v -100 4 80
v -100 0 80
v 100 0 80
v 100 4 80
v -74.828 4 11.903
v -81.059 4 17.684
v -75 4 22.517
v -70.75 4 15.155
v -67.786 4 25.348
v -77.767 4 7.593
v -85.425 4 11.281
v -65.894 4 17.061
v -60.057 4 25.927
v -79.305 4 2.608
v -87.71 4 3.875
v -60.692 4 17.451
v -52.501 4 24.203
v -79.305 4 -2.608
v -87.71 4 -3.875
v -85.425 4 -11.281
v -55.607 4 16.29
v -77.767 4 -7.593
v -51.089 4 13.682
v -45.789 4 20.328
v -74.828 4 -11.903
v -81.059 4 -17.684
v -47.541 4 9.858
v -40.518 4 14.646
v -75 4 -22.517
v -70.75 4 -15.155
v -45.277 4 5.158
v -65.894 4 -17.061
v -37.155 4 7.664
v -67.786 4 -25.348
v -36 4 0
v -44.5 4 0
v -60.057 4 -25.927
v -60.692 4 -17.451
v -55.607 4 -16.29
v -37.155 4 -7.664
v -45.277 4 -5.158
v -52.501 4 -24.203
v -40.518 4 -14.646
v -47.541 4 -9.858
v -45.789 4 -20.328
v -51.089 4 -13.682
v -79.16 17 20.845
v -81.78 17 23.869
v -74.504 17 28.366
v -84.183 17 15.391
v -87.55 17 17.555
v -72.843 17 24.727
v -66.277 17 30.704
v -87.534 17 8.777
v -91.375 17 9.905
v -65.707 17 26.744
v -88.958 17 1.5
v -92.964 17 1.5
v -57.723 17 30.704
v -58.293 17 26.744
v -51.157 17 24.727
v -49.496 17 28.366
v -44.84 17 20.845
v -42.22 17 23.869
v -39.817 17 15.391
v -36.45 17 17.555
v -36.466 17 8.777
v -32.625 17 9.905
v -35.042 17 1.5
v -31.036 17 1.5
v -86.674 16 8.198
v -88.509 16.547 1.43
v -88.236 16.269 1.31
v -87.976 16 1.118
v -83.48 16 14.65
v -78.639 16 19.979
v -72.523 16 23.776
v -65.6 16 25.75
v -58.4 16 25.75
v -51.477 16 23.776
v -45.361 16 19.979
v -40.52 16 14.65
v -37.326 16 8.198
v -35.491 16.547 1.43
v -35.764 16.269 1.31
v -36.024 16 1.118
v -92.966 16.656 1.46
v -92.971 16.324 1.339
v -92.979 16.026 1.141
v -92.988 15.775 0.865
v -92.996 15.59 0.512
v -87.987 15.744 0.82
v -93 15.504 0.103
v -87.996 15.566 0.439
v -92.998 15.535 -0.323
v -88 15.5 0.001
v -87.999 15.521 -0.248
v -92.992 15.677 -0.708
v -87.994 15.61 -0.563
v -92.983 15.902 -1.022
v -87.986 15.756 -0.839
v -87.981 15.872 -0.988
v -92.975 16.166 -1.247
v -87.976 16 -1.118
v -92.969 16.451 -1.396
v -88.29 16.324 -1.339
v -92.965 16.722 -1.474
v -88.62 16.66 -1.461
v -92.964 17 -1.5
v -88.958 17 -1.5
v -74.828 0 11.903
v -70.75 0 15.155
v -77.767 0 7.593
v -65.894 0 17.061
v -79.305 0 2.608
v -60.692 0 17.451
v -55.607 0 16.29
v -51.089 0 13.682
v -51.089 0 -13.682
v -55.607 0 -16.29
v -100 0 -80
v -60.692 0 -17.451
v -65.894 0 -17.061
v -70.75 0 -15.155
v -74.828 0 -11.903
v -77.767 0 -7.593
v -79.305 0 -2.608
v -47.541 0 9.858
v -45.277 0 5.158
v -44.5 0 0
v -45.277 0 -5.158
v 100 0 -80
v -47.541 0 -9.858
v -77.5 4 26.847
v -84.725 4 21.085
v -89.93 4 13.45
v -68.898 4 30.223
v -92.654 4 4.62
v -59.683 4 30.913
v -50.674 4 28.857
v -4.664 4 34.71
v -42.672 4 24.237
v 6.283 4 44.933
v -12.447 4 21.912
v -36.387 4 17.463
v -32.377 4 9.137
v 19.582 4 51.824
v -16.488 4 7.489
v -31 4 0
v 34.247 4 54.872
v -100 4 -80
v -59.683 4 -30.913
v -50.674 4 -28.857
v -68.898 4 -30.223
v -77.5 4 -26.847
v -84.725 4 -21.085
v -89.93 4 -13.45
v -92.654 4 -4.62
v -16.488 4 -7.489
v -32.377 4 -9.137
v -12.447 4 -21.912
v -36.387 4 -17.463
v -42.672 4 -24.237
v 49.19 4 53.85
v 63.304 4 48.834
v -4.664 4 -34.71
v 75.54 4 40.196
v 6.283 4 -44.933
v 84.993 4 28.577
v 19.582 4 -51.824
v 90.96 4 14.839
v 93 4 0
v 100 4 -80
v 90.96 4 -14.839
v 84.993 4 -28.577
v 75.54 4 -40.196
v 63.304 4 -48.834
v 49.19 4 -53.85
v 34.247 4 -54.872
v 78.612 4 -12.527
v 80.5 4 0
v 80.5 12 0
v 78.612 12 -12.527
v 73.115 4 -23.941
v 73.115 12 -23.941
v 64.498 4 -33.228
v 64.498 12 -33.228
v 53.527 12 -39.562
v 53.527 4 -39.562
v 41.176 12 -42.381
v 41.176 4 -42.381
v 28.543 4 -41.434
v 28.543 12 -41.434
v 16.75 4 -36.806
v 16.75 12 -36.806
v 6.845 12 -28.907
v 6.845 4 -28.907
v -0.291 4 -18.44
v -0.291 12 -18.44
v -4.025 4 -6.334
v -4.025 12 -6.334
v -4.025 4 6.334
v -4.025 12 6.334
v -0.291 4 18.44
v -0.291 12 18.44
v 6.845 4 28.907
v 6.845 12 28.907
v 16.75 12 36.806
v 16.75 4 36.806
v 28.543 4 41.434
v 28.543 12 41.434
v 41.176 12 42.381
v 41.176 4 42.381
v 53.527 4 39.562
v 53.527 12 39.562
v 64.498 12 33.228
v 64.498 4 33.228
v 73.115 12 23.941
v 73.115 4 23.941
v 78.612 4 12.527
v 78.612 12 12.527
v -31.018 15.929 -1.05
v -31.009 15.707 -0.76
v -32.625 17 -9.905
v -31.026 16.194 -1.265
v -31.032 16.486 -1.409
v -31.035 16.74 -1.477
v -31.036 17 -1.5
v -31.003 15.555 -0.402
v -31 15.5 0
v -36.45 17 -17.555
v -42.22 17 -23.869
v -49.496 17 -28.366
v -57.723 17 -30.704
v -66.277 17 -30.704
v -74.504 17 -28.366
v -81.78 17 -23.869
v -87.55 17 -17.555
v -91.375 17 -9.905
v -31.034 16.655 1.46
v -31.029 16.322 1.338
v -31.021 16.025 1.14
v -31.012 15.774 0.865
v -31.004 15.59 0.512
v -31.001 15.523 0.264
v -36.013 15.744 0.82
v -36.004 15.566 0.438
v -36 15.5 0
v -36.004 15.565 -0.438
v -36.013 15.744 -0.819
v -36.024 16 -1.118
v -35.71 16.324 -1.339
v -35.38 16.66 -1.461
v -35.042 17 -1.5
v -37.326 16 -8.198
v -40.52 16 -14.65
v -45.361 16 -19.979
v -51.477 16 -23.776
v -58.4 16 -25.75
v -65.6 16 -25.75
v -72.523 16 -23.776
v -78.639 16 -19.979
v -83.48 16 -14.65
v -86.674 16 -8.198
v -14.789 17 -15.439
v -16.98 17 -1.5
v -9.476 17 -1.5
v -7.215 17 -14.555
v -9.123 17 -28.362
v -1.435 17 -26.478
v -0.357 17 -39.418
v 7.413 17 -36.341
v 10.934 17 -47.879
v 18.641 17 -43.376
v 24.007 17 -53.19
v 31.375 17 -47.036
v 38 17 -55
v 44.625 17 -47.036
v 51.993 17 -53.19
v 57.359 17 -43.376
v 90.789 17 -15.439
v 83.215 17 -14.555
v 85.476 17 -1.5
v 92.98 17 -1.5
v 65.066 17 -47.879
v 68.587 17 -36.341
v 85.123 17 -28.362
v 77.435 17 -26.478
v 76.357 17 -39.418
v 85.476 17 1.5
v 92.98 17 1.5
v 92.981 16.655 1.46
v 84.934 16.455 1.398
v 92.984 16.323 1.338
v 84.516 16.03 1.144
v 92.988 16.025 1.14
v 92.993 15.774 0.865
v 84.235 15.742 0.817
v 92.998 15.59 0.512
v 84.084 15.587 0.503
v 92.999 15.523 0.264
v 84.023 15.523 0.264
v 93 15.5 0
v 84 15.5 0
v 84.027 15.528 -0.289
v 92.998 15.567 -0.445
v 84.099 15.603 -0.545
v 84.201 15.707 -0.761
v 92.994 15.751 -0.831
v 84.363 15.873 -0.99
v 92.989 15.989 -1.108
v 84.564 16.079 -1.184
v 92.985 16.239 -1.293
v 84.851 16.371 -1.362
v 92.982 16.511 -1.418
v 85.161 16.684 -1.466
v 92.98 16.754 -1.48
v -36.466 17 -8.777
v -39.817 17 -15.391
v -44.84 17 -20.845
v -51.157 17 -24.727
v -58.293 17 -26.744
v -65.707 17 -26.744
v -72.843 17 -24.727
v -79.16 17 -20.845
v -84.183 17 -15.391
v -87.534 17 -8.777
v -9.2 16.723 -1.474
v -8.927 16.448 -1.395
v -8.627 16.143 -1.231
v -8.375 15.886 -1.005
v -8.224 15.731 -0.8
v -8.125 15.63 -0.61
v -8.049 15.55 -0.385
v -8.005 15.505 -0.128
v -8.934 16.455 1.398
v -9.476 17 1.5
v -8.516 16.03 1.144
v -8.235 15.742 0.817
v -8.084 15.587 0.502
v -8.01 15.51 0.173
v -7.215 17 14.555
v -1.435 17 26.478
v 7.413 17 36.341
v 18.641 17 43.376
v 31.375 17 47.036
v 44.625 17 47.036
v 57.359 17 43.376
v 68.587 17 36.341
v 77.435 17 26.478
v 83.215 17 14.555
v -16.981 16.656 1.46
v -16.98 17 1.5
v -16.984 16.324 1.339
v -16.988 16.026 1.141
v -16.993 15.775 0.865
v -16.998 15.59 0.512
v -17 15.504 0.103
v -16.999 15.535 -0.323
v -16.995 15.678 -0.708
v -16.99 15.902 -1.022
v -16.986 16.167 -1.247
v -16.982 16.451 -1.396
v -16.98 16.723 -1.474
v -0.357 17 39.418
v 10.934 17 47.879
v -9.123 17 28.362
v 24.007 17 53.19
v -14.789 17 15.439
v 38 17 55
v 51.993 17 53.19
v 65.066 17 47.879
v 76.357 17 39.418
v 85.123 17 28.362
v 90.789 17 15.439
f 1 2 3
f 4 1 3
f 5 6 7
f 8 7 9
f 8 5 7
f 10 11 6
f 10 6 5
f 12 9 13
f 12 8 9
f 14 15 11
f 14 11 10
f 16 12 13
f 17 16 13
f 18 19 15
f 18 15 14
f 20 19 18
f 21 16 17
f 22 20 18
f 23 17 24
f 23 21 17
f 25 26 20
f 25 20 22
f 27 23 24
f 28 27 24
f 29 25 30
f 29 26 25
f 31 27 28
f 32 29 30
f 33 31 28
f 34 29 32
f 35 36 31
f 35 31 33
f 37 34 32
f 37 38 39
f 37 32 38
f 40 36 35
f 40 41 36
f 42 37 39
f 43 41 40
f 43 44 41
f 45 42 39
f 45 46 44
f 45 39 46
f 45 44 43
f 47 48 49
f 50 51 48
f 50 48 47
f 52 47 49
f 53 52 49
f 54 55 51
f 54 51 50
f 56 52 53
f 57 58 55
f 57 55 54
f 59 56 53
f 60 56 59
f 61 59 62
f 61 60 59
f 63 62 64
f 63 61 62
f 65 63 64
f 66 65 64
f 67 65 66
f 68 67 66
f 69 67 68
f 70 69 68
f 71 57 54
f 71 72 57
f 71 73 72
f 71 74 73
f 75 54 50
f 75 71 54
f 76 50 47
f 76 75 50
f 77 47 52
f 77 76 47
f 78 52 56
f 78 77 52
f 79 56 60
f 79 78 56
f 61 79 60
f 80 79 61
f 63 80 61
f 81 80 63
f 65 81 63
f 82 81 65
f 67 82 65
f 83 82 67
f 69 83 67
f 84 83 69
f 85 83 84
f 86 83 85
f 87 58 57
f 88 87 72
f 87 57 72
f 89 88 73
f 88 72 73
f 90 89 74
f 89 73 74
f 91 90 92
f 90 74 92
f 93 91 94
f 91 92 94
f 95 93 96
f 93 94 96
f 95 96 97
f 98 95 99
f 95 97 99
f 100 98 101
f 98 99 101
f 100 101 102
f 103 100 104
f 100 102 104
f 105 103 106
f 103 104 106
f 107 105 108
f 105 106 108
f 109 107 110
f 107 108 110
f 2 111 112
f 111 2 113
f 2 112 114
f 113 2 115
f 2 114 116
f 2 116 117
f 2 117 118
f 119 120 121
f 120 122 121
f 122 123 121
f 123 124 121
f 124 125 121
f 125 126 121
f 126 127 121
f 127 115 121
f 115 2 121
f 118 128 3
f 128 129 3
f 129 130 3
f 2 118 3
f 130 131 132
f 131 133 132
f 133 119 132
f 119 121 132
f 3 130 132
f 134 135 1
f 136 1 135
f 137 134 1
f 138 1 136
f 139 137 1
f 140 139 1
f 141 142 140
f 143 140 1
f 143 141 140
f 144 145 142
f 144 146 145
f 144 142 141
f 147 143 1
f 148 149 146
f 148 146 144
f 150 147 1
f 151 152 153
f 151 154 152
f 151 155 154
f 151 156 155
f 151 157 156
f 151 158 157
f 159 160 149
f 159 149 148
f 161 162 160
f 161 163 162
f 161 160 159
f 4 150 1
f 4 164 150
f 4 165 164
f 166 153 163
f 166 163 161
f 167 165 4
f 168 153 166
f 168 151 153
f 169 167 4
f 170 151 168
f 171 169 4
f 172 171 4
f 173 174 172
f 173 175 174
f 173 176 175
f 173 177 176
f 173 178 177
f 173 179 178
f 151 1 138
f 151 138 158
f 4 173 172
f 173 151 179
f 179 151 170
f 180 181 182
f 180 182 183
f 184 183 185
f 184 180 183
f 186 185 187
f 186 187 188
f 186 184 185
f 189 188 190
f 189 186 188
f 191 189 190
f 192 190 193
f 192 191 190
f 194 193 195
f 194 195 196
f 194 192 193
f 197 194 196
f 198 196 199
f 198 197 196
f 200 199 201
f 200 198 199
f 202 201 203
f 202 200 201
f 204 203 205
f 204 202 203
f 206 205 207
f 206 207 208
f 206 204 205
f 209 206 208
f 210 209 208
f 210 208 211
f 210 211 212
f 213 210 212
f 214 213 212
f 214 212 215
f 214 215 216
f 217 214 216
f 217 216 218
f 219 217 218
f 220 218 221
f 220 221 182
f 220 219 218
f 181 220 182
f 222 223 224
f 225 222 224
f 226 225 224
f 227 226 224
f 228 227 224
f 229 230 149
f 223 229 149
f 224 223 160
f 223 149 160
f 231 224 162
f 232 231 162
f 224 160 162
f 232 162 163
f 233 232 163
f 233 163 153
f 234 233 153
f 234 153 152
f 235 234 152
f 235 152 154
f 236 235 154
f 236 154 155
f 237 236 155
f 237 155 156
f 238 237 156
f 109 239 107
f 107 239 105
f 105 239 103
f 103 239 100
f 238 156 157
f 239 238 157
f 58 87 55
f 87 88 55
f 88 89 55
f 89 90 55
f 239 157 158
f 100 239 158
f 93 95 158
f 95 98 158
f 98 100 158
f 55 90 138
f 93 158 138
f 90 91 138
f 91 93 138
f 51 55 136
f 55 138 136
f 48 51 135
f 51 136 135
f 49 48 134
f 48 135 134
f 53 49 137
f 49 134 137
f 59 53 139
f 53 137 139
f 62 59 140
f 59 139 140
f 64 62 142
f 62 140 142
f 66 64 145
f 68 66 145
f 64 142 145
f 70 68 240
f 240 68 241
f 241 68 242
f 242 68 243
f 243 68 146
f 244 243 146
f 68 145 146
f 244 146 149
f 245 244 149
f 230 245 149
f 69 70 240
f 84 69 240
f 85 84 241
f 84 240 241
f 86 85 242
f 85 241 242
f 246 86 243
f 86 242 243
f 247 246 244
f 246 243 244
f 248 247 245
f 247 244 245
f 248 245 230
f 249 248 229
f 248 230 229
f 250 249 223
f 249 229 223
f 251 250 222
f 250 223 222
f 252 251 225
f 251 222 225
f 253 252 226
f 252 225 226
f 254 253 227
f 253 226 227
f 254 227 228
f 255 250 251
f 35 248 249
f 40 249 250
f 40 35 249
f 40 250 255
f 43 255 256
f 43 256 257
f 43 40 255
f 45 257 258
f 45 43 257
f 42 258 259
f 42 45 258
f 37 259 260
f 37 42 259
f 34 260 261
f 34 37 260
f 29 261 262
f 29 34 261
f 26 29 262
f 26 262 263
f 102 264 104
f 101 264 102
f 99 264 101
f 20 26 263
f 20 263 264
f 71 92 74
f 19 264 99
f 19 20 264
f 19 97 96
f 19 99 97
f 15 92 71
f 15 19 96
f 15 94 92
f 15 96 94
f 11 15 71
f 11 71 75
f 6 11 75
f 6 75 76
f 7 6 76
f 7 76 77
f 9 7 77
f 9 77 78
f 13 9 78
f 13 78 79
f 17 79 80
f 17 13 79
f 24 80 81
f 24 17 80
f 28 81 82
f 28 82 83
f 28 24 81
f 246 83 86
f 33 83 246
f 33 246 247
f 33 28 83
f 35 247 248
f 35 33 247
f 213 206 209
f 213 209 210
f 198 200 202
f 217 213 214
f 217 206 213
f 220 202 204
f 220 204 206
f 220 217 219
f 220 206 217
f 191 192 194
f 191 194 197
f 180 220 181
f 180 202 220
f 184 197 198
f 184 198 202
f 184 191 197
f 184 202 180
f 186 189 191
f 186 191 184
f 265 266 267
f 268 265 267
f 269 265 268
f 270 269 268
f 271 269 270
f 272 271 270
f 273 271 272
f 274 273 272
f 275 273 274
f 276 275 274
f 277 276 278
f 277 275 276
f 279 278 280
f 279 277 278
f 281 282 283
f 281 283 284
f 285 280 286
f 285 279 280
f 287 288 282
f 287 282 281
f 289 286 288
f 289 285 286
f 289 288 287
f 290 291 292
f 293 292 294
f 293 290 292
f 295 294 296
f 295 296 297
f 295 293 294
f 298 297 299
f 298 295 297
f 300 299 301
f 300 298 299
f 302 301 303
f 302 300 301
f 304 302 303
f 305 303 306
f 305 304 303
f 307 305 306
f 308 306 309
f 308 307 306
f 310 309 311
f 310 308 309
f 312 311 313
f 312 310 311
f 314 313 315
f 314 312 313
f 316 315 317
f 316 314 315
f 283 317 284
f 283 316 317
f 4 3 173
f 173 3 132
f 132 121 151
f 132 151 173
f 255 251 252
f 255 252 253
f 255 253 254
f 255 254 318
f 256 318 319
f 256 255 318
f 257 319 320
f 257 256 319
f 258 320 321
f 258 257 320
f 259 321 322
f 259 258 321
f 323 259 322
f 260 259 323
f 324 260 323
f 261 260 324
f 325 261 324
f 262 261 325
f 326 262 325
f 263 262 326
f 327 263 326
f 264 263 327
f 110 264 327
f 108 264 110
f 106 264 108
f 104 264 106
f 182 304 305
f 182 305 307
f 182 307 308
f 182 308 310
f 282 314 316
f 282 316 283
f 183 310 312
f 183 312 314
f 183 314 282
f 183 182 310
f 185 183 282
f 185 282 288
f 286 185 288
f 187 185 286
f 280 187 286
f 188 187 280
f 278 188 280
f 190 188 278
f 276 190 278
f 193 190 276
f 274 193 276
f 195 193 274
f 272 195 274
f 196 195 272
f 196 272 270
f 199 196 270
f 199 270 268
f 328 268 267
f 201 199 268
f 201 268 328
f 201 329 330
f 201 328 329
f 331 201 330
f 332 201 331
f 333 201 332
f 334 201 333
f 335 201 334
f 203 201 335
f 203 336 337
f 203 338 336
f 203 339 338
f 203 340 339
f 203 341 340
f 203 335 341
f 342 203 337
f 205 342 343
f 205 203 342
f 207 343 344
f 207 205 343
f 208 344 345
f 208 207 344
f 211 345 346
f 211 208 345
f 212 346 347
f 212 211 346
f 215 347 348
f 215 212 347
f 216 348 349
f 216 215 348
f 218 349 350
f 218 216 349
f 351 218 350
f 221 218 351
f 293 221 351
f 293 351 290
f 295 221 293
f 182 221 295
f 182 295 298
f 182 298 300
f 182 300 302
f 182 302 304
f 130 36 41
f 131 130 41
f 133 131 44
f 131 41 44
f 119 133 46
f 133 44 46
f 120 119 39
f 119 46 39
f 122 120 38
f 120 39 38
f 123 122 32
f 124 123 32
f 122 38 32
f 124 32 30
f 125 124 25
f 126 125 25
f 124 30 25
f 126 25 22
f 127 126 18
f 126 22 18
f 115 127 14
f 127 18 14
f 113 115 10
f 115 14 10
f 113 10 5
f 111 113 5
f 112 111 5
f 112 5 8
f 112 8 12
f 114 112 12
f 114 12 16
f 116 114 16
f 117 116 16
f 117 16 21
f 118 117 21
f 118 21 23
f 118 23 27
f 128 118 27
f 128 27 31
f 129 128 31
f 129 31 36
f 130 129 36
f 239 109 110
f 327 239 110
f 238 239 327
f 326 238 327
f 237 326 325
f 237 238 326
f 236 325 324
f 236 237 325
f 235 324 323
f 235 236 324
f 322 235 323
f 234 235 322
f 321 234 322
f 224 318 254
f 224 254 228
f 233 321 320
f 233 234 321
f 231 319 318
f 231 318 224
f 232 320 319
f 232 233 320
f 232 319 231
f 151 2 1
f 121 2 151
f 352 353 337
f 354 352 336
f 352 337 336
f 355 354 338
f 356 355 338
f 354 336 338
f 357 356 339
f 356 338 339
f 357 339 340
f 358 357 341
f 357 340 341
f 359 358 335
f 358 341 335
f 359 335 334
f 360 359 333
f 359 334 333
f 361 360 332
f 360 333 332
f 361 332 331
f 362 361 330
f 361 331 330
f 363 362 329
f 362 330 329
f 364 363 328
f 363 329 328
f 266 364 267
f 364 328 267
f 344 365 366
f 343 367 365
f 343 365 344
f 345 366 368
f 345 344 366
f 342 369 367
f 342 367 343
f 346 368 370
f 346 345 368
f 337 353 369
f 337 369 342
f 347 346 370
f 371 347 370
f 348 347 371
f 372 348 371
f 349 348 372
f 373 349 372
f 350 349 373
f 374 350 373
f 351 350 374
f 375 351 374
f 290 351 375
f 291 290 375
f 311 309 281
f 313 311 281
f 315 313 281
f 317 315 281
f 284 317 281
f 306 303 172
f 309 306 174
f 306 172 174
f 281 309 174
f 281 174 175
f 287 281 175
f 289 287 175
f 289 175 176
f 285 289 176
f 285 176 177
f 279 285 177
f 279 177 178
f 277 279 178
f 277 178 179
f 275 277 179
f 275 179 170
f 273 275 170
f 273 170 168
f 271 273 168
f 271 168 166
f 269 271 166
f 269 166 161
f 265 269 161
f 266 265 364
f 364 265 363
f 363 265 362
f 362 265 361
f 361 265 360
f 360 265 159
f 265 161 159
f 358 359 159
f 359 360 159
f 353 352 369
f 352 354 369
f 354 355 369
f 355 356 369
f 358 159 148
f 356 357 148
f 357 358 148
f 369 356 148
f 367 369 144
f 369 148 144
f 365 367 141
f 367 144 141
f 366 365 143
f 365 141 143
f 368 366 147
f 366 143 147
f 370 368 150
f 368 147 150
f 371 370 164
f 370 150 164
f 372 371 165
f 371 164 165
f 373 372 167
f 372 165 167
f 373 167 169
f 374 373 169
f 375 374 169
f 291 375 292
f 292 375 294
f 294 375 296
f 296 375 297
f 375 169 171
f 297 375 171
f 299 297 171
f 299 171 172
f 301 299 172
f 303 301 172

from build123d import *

# Parameters (mm, degrees)
SKETCH1_W                = 200
SKETCH1_H                = 160
BOSS_EXTRUDE1_DEPTH      = 4
SKETCH2_R                = 31
SKETCH2_R_2              = 26
SKETCH2_R_3              = 55
SKETCH2_R_4              = 42.5
BOSS_EXTRUDE2_DEPTH      = 13
CHAMFER2_SIZE            = 5
CHAMFER4_SIZE            = 1
SKETCH9_R                = 17.5
CUT_EXTRUDE8_DEPTH       = 5
SKETCH11_R               = 1.5
CUT_EXTRUDE10_DEPTH      = 101
CUT_EXTRUDE10_DEPTH_BACK = 101


with BuildPart() as part:
    # Sketch1 → Boss-Extrude1 (new body)
    with BuildSketch(Plane(origin=(0, 0, 0), x_dir=(1, 0, 0), z_dir=(0, 1, 0))):
        Rectangle(SKETCH1_W, SKETCH1_H)
    extrude(amount=BOSS_EXTRUDE1_DEPTH)

    # Sketch2 → Boss-Extrude2 (add)
    with BuildSketch(Plane(origin=(0, 4, 0), x_dir=(1, 0, 0), z_dir=(0, 1, 0))):
        with Locations((-62, 0)):
            Circle(SKETCH2_R)
        with Locations((-62, 0)):
            Circle(SKETCH2_R_2, mode=Mode.SUBTRACT)
        with Locations((38, 0)):
            Circle(SKETCH2_R_3)
        with Locations((38, 0)):
            Circle(SKETCH2_R_4, mode=Mode.SUBTRACT)
    extrude(amount=BOSS_EXTRUDE2_DEPTH)

    # Chamfer2
    chamfer2_edges = [part.edges().sort_by_distance(p)[0] for p in [
        (-4.5, 17, 0),
    ]]
    chamfer(chamfer2_edges, length=CHAMFER2_SIZE)

    # Chamfer4
    chamfer4_edges = [part.edges().sort_by_distance(p)[0] for p in [
        (-88, 17, 0),
    ]]
    chamfer(chamfer4_edges, length=CHAMFER4_SIZE)

    # Sketch9 → Cut-Extrude8 (cut, through all)
    with BuildSketch(Plane(origin=(0, 4, 0), x_dir=(1, 0, 0), z_dir=(0, 1, 0))):
        with Locations((-62, 0)):
            Circle(SKETCH9_R)
    extrude(amount=-CUT_EXTRUDE8_DEPTH, mode=Mode.SUBTRACT)

    # Sketch11 → Cut-Extrude10 (cut, two sides)
    with BuildSketch(Plane(origin=(0, 0, 0), x_dir=(0, 0, -1), z_dir=(1, 0, 0))) as cut_extrude10_sk:
        with Locations((0, 17)):
            Circle(SKETCH11_R)
    extrude(amount=CUT_EXTRUDE10_DEPTH, mode=Mode.SUBTRACT)
    extrude(cut_extrude10_sk.sketch, amount=-CUT_EXTRUDE10_DEPTH_BACK, mode=Mode.SUBTRACT)


solid = part.part
